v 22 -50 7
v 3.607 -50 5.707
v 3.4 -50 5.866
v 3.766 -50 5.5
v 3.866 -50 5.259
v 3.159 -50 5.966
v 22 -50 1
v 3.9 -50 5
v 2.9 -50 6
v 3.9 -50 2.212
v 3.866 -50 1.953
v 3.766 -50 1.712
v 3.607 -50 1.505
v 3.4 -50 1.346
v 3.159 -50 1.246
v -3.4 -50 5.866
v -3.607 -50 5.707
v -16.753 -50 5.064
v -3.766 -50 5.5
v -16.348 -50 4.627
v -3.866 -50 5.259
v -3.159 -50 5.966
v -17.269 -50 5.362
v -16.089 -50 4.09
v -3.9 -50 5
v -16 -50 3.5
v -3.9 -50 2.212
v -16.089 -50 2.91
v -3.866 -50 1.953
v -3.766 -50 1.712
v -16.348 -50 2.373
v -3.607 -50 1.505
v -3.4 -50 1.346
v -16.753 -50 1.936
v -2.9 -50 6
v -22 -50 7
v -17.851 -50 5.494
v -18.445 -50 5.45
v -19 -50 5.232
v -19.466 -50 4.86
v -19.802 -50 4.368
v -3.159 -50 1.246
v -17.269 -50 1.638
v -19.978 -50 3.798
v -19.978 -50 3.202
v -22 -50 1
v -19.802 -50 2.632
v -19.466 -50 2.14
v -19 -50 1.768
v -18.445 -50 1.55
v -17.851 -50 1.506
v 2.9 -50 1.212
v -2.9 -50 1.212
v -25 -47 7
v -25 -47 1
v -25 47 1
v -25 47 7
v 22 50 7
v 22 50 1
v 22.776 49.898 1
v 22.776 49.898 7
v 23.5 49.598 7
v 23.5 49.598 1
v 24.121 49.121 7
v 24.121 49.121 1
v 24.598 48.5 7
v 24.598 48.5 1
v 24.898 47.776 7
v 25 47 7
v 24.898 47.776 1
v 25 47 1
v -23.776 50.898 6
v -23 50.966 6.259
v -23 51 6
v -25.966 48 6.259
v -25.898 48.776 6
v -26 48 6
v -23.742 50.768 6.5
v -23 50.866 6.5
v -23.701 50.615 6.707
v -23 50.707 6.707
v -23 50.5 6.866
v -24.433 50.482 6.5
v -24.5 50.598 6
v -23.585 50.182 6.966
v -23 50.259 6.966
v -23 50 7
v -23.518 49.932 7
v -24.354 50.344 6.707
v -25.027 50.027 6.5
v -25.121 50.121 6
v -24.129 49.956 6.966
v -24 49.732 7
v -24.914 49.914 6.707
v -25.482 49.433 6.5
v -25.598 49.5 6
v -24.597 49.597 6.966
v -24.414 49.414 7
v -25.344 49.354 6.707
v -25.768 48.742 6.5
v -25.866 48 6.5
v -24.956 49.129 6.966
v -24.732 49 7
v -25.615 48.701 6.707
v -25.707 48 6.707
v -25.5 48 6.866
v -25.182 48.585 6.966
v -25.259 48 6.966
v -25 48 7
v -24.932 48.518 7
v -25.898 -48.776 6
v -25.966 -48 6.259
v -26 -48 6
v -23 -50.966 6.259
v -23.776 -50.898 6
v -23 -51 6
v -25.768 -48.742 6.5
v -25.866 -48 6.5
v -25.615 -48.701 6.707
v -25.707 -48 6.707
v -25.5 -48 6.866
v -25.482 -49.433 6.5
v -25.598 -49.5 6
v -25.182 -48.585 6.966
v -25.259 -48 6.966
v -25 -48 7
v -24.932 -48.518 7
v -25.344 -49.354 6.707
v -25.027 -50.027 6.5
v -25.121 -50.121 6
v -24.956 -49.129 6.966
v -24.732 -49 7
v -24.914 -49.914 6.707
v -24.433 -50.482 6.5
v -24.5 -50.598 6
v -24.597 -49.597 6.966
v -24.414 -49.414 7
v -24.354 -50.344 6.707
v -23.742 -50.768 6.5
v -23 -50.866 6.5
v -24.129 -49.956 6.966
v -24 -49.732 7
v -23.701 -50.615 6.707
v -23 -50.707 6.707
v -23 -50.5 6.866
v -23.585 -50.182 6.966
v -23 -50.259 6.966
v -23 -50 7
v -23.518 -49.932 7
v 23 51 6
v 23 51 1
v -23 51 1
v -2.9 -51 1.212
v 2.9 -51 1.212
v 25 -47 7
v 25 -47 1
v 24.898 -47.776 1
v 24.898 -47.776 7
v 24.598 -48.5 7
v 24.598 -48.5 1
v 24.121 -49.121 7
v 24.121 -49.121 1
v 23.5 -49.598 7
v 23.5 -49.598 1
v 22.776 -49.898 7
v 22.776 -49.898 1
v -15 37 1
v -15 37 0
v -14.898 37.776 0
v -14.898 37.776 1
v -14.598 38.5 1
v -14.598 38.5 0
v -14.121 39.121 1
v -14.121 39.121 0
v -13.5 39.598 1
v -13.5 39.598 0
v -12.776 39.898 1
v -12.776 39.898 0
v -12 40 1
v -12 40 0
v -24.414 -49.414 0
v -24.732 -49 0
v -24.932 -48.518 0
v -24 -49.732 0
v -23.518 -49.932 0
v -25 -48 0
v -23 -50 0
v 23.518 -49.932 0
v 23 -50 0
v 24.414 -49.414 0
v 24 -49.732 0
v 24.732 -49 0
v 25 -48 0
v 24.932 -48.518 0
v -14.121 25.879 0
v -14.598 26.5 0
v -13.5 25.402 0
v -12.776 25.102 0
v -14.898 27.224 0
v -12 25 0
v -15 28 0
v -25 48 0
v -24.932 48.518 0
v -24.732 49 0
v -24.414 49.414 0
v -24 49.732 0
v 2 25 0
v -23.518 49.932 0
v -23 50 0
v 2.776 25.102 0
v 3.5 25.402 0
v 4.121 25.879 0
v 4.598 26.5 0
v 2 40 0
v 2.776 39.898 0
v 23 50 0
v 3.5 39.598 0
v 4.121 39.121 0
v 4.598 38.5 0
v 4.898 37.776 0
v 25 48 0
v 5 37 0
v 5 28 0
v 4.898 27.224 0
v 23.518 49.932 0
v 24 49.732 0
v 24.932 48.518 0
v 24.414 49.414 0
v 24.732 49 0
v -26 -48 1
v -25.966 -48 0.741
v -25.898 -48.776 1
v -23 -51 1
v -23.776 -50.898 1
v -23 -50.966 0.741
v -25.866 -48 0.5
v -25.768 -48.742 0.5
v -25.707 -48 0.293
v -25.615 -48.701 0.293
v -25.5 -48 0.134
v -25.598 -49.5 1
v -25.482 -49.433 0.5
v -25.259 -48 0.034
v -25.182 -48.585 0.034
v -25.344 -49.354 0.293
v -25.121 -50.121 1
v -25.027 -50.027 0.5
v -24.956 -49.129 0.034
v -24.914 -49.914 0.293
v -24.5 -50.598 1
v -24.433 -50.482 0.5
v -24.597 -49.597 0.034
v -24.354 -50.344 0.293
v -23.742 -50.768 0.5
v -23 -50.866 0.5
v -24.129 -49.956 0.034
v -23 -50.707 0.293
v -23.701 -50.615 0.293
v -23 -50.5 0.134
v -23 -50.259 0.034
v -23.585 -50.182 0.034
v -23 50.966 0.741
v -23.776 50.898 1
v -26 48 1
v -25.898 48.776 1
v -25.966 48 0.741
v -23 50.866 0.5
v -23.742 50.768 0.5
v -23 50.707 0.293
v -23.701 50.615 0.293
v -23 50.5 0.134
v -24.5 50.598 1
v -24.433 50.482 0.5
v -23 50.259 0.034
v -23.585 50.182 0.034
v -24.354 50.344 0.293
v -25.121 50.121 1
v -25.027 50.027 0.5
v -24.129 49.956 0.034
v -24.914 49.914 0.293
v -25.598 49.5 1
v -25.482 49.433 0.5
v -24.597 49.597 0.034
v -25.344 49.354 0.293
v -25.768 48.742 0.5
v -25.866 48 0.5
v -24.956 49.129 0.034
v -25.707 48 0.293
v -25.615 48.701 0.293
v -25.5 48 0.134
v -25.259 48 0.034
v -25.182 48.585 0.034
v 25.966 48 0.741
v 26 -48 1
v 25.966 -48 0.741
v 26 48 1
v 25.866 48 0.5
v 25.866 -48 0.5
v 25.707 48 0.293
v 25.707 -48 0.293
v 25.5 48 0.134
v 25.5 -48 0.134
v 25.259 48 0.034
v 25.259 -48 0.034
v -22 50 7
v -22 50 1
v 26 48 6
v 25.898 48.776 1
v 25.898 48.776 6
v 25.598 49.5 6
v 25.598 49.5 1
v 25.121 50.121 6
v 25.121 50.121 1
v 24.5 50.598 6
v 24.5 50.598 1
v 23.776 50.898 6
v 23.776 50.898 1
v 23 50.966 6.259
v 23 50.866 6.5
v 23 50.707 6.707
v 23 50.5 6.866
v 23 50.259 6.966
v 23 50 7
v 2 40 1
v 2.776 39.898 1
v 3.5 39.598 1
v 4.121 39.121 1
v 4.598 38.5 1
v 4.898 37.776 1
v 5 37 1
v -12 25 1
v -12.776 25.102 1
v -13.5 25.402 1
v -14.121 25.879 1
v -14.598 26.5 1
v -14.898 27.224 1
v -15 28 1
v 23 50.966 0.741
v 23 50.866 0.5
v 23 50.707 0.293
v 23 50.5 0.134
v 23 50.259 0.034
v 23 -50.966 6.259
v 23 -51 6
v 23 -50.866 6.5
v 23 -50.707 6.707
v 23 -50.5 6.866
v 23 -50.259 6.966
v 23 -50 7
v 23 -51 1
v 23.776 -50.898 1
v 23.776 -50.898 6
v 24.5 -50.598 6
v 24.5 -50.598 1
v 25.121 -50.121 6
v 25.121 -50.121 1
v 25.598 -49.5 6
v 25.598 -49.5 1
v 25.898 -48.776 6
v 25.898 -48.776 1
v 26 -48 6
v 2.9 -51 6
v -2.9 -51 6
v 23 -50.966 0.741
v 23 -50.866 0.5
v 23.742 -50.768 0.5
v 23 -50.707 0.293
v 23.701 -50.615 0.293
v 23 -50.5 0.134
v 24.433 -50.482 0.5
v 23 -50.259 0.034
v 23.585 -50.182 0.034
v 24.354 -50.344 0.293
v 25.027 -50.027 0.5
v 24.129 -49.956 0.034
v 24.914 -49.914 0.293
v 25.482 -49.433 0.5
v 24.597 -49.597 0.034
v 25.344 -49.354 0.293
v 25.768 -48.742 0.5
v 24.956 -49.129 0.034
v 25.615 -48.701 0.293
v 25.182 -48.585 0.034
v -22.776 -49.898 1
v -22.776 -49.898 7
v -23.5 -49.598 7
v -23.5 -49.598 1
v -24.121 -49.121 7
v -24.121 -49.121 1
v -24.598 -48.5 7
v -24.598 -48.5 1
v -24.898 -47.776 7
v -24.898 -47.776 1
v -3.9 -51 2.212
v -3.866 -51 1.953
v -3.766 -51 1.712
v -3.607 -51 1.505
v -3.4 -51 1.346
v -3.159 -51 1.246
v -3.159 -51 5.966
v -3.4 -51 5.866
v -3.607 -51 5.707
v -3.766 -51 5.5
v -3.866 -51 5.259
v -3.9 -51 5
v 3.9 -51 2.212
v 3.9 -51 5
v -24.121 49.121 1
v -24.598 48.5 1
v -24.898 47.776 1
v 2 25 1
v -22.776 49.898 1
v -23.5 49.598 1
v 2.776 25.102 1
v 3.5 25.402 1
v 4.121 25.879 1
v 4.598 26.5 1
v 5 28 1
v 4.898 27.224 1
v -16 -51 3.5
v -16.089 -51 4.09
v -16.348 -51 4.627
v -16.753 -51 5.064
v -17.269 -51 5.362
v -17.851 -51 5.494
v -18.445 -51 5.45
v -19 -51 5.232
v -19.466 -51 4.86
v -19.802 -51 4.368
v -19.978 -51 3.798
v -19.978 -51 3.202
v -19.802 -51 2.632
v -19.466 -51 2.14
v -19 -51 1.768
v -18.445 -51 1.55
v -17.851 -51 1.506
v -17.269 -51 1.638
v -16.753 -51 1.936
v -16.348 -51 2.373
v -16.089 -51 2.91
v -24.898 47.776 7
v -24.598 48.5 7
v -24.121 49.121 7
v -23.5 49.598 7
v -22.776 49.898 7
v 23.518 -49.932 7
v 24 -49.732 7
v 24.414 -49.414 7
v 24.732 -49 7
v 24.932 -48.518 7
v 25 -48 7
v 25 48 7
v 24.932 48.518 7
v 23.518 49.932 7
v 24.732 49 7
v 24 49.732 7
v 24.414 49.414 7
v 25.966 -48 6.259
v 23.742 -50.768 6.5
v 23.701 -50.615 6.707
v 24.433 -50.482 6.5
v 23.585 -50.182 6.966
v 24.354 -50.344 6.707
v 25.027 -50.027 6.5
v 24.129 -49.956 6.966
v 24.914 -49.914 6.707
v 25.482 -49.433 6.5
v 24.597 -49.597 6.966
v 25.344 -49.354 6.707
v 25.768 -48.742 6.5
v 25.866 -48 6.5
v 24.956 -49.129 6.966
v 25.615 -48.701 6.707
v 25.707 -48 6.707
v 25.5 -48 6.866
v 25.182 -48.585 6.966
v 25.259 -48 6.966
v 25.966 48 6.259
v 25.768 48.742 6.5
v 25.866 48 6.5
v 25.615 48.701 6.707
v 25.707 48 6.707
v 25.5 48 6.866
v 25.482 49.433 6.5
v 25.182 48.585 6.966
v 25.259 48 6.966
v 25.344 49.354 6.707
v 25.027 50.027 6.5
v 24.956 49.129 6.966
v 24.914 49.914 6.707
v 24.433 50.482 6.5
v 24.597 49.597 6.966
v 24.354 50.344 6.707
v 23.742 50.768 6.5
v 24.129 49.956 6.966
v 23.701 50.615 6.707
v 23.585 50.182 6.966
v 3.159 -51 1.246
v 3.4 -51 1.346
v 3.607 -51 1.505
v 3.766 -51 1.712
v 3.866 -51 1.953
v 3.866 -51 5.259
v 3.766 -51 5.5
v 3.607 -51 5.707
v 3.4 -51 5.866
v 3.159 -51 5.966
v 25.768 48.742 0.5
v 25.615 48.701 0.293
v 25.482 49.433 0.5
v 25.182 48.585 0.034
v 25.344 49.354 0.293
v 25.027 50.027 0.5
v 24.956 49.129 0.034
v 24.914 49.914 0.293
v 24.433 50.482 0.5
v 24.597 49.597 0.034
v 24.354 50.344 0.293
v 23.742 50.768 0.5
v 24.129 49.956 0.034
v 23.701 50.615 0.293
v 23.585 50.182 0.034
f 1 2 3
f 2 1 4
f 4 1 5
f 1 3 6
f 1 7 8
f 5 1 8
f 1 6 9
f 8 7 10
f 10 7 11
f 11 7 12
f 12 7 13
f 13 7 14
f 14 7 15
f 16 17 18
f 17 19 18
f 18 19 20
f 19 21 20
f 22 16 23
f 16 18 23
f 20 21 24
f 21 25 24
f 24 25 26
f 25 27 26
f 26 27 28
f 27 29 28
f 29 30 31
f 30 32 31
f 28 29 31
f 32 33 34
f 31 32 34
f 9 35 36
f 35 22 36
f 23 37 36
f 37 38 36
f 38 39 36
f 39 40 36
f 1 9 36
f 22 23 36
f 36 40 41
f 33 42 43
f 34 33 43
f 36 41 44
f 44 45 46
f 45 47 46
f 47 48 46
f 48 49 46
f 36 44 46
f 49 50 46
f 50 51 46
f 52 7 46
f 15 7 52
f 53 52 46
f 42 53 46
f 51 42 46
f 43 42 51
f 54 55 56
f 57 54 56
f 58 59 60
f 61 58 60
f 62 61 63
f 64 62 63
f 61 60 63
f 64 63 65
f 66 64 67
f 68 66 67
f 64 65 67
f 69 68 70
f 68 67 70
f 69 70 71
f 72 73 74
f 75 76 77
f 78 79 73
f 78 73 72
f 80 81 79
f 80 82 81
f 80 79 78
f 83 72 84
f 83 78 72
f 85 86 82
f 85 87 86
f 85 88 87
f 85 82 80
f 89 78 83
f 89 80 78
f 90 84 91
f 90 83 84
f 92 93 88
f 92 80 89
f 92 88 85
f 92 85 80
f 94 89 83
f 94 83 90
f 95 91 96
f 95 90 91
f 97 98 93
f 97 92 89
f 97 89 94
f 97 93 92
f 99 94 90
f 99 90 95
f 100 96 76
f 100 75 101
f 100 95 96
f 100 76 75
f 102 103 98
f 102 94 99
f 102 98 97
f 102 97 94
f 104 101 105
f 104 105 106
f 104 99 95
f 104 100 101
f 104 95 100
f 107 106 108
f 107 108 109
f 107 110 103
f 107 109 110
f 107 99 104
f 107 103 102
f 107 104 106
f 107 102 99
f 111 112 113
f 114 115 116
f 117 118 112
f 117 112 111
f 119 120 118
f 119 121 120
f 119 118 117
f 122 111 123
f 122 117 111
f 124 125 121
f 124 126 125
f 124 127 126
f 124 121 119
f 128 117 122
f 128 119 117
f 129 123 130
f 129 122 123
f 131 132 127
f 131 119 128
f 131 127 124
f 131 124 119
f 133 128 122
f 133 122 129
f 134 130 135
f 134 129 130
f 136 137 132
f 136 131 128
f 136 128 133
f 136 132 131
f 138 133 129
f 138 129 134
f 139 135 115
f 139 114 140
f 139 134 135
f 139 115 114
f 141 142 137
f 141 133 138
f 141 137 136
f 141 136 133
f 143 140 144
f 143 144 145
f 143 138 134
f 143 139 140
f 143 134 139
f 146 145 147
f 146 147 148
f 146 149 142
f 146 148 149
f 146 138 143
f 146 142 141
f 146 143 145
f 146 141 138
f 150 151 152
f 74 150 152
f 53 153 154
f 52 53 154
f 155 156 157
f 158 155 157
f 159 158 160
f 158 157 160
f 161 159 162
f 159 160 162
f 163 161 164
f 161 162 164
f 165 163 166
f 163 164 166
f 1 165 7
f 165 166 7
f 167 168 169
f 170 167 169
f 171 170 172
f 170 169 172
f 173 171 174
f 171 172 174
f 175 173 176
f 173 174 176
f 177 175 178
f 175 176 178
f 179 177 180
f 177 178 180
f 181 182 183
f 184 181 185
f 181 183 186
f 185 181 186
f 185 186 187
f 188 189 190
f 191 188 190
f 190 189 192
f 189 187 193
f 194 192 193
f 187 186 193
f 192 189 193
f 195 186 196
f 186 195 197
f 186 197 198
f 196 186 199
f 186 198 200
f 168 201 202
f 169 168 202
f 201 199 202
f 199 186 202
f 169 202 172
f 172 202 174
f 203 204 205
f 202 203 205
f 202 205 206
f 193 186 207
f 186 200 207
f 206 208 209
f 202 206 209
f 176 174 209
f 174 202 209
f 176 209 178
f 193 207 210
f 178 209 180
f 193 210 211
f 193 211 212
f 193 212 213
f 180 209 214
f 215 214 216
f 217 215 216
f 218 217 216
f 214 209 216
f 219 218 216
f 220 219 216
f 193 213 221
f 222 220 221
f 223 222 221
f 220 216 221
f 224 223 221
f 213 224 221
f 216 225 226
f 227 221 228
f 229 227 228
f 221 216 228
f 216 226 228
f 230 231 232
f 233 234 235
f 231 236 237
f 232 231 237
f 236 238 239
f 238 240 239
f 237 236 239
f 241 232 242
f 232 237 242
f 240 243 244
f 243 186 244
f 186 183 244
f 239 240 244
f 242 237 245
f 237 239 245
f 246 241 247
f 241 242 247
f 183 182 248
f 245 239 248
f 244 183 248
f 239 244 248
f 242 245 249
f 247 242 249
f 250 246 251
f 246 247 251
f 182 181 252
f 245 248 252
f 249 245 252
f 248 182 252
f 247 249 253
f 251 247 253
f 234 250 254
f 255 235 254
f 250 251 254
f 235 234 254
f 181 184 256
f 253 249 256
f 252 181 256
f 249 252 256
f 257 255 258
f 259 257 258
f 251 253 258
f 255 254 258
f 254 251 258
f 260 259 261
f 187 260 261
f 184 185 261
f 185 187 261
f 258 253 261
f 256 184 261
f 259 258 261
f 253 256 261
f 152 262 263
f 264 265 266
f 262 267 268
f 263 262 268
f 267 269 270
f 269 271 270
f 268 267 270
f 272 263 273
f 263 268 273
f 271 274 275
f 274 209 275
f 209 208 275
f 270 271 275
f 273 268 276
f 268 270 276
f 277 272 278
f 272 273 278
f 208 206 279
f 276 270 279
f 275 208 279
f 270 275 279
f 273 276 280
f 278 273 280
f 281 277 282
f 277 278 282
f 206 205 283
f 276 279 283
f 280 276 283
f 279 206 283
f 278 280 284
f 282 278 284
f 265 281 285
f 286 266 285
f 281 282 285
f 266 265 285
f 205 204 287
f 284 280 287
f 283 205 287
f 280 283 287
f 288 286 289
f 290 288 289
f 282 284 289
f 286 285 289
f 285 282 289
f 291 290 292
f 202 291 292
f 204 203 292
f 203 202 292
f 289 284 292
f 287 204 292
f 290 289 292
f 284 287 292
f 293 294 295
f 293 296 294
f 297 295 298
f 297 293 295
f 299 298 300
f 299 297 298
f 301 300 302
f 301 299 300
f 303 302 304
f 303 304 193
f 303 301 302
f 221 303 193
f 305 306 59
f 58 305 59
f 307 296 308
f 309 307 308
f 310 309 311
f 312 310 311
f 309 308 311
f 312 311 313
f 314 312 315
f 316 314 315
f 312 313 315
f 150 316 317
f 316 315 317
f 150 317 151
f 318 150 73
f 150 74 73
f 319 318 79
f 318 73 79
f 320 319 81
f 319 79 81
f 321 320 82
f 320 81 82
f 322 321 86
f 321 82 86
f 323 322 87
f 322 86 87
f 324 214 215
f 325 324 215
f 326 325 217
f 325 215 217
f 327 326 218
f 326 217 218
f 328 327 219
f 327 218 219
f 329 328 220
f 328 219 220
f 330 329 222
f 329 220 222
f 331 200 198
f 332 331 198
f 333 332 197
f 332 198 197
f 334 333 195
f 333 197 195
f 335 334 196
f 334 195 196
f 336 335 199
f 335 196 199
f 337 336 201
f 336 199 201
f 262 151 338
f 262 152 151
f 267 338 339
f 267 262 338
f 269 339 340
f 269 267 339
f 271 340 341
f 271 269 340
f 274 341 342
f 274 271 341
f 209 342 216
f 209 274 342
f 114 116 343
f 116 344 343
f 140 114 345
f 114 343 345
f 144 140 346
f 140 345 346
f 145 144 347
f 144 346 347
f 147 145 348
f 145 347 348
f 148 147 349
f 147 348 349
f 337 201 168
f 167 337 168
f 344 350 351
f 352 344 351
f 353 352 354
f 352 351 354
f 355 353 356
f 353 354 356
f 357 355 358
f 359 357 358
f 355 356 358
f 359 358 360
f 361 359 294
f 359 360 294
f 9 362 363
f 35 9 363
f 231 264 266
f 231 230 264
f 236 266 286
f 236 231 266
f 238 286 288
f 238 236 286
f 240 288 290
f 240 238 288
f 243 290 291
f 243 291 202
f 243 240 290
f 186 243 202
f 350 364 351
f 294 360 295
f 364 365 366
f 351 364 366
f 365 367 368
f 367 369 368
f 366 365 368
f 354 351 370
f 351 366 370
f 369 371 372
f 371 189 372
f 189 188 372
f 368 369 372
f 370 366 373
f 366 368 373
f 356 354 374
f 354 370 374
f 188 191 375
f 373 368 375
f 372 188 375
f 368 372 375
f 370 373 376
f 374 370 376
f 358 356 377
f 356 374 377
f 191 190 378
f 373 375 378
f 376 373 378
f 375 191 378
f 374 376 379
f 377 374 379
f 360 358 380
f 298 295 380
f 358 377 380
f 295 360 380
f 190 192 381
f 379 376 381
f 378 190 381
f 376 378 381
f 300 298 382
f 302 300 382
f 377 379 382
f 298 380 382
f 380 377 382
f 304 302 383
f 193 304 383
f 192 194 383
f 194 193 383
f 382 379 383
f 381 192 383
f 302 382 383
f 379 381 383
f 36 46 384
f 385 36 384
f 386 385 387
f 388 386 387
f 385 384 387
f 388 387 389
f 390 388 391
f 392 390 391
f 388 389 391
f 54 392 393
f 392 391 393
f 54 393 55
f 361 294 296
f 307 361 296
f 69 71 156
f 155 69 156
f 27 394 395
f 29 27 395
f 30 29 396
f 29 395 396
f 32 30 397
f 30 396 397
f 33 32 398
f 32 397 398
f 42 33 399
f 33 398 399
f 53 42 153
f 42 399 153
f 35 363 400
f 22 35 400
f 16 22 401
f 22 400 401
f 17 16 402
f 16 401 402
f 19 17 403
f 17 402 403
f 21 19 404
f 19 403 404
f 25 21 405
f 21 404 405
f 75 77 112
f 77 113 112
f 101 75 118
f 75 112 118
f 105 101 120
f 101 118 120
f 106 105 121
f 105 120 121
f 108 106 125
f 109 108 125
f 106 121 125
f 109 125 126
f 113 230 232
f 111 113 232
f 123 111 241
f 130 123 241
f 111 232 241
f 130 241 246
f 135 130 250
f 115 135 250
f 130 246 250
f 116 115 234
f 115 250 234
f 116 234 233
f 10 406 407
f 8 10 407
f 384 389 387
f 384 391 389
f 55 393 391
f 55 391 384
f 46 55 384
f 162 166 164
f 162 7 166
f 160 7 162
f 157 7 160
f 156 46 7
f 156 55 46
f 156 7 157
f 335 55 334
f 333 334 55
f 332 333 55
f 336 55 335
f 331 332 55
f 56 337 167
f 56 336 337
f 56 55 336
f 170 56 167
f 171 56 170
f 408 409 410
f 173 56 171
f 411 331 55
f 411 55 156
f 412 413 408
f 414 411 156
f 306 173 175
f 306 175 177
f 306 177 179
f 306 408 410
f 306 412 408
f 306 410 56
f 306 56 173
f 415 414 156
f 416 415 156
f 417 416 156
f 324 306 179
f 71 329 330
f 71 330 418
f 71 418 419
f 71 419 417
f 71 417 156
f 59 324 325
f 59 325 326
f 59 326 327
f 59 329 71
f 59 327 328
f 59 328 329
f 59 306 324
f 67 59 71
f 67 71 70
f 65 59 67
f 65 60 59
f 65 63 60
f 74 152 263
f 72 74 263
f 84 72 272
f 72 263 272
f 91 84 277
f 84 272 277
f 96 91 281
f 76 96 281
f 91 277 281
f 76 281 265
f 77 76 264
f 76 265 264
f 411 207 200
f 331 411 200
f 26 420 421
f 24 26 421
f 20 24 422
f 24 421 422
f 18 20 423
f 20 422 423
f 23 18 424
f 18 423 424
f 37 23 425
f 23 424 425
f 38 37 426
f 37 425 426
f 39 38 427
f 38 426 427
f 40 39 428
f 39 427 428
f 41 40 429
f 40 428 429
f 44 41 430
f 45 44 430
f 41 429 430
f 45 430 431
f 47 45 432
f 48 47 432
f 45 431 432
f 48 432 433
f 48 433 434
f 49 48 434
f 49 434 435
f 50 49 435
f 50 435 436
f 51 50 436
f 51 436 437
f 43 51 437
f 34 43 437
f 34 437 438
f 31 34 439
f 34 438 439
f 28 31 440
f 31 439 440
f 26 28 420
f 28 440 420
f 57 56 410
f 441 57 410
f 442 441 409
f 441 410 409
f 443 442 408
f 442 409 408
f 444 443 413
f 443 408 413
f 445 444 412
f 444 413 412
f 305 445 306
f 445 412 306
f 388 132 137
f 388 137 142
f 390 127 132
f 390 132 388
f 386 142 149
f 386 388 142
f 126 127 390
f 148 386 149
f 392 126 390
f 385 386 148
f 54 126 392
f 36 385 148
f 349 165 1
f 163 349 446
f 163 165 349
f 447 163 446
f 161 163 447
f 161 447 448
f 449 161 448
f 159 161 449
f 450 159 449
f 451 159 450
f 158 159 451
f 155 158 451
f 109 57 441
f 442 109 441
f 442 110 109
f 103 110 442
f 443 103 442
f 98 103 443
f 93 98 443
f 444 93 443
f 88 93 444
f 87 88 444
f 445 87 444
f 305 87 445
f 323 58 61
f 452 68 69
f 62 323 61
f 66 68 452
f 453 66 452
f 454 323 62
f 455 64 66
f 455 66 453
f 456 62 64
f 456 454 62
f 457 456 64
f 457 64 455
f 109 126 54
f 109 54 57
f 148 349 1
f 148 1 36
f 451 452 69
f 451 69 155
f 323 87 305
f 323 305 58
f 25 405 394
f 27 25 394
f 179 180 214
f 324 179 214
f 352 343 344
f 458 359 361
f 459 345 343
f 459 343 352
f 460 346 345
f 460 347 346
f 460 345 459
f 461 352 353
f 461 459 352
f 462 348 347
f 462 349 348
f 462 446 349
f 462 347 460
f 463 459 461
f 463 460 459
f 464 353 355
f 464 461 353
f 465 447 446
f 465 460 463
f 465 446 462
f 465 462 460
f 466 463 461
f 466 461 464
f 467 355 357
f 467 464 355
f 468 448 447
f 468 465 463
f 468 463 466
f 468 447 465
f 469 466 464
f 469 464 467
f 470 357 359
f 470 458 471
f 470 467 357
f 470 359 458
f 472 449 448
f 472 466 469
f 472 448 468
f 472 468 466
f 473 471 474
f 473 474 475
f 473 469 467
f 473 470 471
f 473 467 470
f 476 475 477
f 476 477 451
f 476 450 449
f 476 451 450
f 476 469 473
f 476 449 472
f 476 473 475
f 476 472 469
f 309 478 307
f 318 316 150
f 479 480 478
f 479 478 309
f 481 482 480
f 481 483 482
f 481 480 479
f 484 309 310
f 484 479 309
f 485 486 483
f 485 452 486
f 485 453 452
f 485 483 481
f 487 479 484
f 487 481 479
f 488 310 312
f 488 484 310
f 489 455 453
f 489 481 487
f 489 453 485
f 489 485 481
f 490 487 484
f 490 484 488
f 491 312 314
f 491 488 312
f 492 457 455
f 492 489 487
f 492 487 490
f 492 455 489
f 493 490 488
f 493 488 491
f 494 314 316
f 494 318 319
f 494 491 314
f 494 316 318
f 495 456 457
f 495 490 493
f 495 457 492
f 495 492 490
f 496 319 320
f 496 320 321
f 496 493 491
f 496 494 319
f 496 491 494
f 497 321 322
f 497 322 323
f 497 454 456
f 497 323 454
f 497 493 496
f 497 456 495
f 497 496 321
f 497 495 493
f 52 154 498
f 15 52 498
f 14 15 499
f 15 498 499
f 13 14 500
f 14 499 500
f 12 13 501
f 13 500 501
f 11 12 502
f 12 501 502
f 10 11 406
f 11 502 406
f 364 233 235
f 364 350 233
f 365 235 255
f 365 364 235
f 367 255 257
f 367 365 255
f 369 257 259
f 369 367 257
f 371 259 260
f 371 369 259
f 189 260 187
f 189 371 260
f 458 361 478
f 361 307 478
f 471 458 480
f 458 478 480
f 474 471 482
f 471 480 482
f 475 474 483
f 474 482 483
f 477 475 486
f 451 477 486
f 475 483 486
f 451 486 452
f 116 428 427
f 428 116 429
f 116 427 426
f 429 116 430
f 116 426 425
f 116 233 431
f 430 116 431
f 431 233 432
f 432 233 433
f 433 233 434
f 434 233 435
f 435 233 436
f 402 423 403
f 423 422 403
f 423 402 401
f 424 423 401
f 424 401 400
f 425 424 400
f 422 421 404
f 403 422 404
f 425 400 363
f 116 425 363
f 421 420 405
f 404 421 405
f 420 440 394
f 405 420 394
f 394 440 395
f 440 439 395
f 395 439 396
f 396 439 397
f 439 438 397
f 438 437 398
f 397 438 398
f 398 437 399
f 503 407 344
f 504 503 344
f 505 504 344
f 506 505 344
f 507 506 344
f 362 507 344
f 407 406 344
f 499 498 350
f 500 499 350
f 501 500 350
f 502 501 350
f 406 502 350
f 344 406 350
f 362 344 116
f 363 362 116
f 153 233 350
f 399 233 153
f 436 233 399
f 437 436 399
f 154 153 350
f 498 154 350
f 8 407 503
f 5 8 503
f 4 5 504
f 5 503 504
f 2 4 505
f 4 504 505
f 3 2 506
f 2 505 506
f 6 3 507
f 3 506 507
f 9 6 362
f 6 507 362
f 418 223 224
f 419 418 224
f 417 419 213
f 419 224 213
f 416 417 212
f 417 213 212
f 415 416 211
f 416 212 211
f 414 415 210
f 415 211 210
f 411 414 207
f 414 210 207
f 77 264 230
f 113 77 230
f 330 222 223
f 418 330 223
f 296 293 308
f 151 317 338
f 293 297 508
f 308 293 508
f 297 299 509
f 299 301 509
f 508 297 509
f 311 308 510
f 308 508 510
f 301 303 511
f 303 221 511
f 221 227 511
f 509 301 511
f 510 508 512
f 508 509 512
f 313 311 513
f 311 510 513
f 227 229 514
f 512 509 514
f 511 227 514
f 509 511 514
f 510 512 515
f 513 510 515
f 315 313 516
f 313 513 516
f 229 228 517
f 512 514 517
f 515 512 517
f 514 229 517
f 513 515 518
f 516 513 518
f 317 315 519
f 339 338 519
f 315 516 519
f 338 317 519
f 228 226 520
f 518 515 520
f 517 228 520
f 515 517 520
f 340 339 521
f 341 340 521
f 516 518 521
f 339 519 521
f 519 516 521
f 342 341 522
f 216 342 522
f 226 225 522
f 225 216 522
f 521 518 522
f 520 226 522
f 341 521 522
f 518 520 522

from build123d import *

# Parameters (mm, degrees)
F1_DEPTH = 1
F2_DEPTH = 7
F3_R     = 0.99999
F4_R     = 2
F5_DEPTH = 1


# Not quite as in the source:
# - a fillet or chamfer is up to 0.001 mm smaller than in the source, because OpenCascade refuses the exact size


with BuildPart() as f1:
    # F0 (on Top) → F1 (new body)
    with BuildSketch(Plane.XY):
        with BuildLine():
            Line((26, -48), (26, 48))
            ThreePointArc((26, 48), (25.1213203436, 50.1213203436), (23, 51))
            Line((23, 51), (-23, 51))
            ThreePointArc((-23, 51), (-25.1213203436, 50.1213203436), (-26, 48))
            Line((-26, 48), (-26, -48))
            ThreePointArc((-26, -48), (-25.1213203436, -50.1213203436), (-23, -51))
            Line((-23, -51), (23, -51))
            ThreePointArc((23, -51), (25.1213203436, -50.1213203436), (26, -48))
        make_face()
        with BuildLine():
            ThreePointArc((-25, 47), (-24.1213203436, 49.1213203436), (-22, 50))
            Line((-22, 50), (22, 50))
            ThreePointArc((22, 50), (24.1213203436, 49.1213203436), (25, 47))
            Line((25, 47), (25, -47))
            ThreePointArc((25, -47), (24.1213203436, -49.1213203436), (22, -50))
            Line((22, -50), (-22, -50))
            ThreePointArc((-22, -50), (-24.1213203436, -49.1213203436), (-25, -47))
            Line((-25, -47), (-25, 47))
        make_face(mode=Mode.SUBTRACT)
        with BuildLine():
            Line((22, 50), (-22, 50))
            ThreePointArc((-22, 50), (-24.1213203436, 49.1213203436), (-25, 47))
            Line((-25, 47), (-25, -47))
            ThreePointArc((-25, -47), (-24.1213203436, -49.1213203436), (-22, -50))
            Line((-22, -50), (22, -50))
            ThreePointArc((22, -50), (24.1213203436, -49.1213203436), (25, -47))
            Line((25, -47), (25, 47))
            ThreePointArc((25, 47), (24.1213203436, 49.1213203436), (22, 50))
        make_face()
        with BuildLine():
            ThreePointArc((-15, 37), (-14.1213203436, 39.1213203436), (-12, 40))
            Line((-12, 40), (2, 40))
            ThreePointArc((2, 40), (4.1213203436, 39.1213203436), (5, 37))
            Line((5, 37), (5, 28))
            ThreePointArc((5, 28), (4.1213203436, 25.8786796564), (2, 25))
            Line((2, 25), (-12, 25))
            ThreePointArc((-12, 25), (-14.1213203436, 25.8786796564), (-15, 28))
            Line((-15, 28), (-15, 37))
        make_face(mode=Mode.SUBTRACT)
    extrude(amount=F1_DEPTH)

    # F0 (on Top) → F2 (join)
    with BuildSketch(Plane.XY):
        with BuildLine():
            Line((26, -48), (26, 48))
            ThreePointArc((26, 48), (25.1213203436, 50.1213203436), (23, 51))
            Line((23, 51), (-23, 51))
            ThreePointArc((-23, 51), (-25.1213203436, 50.1213203436), (-26, 48))
            Line((-26, 48), (-26, -48))
            ThreePointArc((-26, -48), (-25.1213203436, -50.1213203436), (-23, -51))
            Line((-23, -51), (23, -51))
            ThreePointArc((23, -51), (25.1213203436, -50.1213203436), (26, -48))
        make_face()
        with BuildLine():
            ThreePointArc((-25, 47), (-24.1213203436, 49.1213203436), (-22, 50))
            Line((-22, 50), (22, 50))
            ThreePointArc((22, 50), (24.1213203436, 49.1213203436), (25, 47))
            Line((25, 47), (25, -47))
            ThreePointArc((25, -47), (24.1213203436, -49.1213203436), (22, -50))
            Line((22, -50), (-22, -50))
            ThreePointArc((-22, -50), (-24.1213203436, -49.1213203436), (-25, -47))
            Line((-25, -47), (-25, 47))
        make_face(mode=Mode.SUBTRACT)
    extrude(amount=F2_DEPTH)

    # F3 (radius 1 in the source; OpenCascade refuses exactly that, so slightly less here)
    f3_edges = [f1.edges().sort_by_distance(p)[0] for p in [
        (26, 0, 0),
        (-26, 0, 7),
    ]]
    fillet(f3_edges, radius=F3_R)

    # F4 (on face) → F5 (cut, through all)
    with BuildSketch(Plane.XZ.offset(51)):
        with BuildLine():
            Line((2.9, 6), (-2.9, 6))
            ThreePointArc((-2.9, 6), (-3.6071067812, 5.7071067812), (-3.9, 5))
            Line((-3.9, 5), (-3.9, 2.2120511904))
            ThreePointArc((-3.9, 2.2120511904), (-3.6071067812, 1.5049444092), (-2.9, 1.2120511904))
            Line((-2.9, 1.2120511904), (2.9, 1.2120511904))
            ThreePointArc((2.9, 1.2120511904), (3.6071067812, 1.5049444092), (3.9, 2.2120511904))
            Line((3.9, 2.2120511904), (3.9, 5))
            ThreePointArc((3.9, 5), (3.6071067812, 5.7071067812), (2.9, 6))
        make_face()
        with Locations((-18, 3.5)):
            Circle(F4_R)
    extrude(amount=-F5_DEPTH, mode=Mode.SUBTRACT)


solid = f1.part
